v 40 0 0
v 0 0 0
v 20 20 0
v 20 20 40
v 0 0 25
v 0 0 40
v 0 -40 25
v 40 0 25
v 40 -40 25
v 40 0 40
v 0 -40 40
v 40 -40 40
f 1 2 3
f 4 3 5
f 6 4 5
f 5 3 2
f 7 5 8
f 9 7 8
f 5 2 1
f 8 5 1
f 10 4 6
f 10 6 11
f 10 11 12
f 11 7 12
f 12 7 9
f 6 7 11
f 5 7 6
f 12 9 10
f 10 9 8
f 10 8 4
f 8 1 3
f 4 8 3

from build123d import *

# Parameters (mm, degrees)
F0_W     = 40
F0_H     = 40
F1_DEPTH = 40
F2_DEPTH = 25


with BuildPart() as f1:
    # F0 (on Top) → F1 (new body)
    with BuildSketch(Plane.XY):
        Polygon((20, 20), (0, 0), (40, 0), align=None)
        with Locations((20, -20)):
            Rectangle(F0_W, F0_H)
    extrude(amount=F1_DEPTH)

    # F0 (on Top) → F2 (cut)
    with BuildSketch(Plane.XY):
        with Locations((20, -20)):
            Rectangle(F0_W, F0_H)
    extrude(amount=F2_DEPTH, mode=Mode.SUBTRACT)


solid = f1.part
